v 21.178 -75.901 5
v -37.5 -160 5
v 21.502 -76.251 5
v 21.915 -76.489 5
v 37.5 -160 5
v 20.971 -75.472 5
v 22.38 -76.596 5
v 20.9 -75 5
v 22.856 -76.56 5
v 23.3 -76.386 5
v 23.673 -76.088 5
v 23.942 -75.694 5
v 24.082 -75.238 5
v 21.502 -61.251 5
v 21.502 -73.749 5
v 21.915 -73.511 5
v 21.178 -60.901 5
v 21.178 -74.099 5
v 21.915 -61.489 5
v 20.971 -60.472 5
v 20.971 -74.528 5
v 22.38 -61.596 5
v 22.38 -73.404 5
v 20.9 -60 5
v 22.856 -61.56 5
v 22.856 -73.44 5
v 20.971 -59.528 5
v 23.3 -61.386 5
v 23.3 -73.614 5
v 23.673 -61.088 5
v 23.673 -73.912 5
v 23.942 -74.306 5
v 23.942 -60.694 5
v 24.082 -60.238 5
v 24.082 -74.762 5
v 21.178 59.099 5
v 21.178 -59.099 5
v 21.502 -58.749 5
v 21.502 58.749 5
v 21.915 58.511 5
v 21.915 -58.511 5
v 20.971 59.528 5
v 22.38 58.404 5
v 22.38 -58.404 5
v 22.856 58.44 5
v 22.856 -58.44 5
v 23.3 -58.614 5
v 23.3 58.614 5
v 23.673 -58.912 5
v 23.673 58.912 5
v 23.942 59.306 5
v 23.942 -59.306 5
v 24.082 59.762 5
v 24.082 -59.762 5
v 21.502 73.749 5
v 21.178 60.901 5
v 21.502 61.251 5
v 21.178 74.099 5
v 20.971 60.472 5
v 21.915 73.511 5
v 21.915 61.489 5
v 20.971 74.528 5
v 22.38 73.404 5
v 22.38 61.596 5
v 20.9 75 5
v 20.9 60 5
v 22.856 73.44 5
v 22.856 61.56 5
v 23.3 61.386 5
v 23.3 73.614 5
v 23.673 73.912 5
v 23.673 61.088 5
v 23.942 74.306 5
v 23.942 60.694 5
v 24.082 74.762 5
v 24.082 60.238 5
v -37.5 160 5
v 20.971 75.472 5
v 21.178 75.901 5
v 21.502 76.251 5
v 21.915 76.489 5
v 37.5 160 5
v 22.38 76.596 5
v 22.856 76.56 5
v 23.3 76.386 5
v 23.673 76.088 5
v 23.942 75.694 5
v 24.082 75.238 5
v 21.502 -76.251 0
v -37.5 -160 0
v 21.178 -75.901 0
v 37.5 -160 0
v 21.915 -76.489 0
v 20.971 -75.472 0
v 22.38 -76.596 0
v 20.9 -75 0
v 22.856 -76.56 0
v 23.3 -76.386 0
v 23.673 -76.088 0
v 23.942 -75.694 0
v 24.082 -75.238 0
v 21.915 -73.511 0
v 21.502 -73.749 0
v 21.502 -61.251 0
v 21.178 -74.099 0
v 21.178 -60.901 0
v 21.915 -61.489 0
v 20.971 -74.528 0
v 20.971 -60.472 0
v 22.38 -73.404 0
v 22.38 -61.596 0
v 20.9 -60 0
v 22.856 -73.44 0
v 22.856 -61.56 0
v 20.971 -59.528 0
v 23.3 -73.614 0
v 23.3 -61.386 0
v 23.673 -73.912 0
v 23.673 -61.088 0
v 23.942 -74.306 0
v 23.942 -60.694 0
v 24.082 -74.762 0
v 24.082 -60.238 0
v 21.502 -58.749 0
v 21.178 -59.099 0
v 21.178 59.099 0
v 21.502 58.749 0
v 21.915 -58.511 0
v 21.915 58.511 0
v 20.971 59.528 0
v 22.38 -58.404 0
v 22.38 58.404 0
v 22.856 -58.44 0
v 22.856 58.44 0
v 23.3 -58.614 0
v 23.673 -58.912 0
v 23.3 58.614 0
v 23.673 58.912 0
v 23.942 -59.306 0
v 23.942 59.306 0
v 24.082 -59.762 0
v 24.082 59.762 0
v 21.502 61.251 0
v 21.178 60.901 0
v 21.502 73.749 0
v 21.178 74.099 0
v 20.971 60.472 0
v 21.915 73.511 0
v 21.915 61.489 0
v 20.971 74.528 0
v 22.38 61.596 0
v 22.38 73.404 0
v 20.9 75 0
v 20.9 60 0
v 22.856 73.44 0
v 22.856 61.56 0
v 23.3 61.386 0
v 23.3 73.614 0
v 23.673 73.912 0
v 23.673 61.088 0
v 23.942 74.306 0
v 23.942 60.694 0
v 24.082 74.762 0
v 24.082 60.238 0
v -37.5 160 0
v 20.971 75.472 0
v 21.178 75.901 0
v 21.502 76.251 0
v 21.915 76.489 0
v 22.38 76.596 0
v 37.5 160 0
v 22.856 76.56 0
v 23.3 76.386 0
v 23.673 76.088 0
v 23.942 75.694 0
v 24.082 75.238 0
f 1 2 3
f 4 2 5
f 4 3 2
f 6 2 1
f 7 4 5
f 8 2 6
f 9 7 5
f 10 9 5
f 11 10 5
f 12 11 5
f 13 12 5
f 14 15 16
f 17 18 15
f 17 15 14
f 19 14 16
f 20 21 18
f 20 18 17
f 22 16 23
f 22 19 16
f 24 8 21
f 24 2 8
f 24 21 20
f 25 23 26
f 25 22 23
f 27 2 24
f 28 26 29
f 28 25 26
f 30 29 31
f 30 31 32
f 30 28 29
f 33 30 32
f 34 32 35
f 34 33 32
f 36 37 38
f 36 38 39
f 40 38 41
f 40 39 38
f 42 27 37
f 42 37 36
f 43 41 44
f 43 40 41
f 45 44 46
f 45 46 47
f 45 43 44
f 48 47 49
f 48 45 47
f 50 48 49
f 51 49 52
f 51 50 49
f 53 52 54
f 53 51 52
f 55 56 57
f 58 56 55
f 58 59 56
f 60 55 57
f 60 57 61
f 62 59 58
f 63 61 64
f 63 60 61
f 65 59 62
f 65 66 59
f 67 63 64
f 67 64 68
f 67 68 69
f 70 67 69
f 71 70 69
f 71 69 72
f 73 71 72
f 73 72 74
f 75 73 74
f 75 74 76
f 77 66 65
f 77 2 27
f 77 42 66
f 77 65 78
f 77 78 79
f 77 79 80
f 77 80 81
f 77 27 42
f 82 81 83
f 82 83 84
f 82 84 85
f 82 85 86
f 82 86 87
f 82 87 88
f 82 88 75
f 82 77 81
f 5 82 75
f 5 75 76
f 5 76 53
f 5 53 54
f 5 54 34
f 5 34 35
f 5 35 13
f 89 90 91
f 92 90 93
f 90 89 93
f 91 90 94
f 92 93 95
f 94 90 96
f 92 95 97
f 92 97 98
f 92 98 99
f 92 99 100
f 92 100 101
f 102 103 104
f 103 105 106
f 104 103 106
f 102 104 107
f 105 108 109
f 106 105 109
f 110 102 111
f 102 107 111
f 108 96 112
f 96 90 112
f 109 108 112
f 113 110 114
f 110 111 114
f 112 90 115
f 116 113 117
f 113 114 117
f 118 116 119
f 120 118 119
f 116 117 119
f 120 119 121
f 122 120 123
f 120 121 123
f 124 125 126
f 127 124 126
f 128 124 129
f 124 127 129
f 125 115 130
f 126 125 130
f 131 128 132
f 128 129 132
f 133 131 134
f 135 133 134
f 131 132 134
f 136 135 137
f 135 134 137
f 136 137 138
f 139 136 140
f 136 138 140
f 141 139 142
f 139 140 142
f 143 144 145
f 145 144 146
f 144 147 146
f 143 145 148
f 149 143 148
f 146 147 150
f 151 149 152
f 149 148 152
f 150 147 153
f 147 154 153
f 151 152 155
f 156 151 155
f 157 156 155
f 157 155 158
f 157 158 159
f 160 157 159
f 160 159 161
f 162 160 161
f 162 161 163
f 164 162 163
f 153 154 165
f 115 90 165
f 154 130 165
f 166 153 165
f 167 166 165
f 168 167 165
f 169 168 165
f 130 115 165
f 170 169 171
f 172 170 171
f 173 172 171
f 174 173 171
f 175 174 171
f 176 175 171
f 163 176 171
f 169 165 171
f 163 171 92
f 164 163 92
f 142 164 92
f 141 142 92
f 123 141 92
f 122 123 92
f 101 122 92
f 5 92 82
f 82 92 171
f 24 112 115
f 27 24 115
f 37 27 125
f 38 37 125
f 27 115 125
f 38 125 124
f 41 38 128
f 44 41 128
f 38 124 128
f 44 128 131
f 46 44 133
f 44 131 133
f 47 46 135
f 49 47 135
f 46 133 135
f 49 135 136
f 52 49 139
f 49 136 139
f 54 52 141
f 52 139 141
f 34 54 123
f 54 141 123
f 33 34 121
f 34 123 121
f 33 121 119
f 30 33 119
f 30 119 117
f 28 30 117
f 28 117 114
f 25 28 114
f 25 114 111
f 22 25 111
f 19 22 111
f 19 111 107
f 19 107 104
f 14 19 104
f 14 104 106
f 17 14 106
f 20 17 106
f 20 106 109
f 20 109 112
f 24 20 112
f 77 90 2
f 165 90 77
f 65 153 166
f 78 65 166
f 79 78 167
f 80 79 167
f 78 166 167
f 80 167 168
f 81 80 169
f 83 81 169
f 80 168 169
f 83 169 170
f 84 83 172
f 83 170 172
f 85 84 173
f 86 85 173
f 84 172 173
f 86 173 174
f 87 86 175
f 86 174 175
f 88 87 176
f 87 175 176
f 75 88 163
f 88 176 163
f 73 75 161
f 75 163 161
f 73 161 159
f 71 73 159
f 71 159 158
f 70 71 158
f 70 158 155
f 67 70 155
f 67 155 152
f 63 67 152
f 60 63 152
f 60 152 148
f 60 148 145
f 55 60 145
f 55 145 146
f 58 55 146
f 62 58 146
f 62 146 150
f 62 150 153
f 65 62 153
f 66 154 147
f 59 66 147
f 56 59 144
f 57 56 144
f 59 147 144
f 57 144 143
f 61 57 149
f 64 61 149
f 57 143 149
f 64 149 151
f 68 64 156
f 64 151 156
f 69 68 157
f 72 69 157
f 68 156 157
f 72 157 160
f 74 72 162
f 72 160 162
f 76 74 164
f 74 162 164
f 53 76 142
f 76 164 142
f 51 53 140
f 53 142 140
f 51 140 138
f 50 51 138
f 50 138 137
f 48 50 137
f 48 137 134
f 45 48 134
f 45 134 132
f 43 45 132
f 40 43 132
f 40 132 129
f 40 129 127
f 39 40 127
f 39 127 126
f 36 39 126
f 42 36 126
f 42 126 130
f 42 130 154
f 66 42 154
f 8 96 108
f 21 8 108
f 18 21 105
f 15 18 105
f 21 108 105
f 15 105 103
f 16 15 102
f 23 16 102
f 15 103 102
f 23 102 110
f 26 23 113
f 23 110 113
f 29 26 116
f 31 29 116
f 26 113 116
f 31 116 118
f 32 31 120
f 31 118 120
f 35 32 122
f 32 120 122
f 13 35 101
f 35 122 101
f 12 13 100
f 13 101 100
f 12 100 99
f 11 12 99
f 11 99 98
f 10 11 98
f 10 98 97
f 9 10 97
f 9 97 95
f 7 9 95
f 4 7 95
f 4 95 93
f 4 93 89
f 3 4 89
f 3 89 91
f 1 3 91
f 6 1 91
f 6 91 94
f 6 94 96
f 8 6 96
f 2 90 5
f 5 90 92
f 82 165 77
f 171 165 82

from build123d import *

# Parameters (mm, degrees)
SKETCH1_W           = 75
SKETCH1_H           = 320
BOSS_EXTRUDE1_DEPTH = 5
CUT_EXTRUDE1_REACH  = 7
SKETCH2_R           = 1.6


with BuildPart() as part:
    # Sketch1 → Boss-Extrude1 (new body)
    with BuildSketch(Plane.XY):
        Rectangle(SKETCH1_W, SKETCH1_H)
    extrude(amount=BOSS_EXTRUDE1_DEPTH)

    # Sketch2 → Cut-Extrude1 (cut, up to next)
    with BuildSketch(Plane(origin=(0, 0, 0), x_dir=(-1, 0, 0), z_dir=(0, 0, -1)), mode=Mode.PRIVATE) as cut_extrude1_sk1:
        with Locations((-22.5, 75)):
            Circle(SKETCH2_R)
    cut_extrude1_tool1 = extrude(cut_extrude1_sk1.sketch, amount=-CUT_EXTRUDE1_REACH, mode=Mode.PRIVATE) & part.part
    add(cut_extrude1_tool1.solids().sort_by_distance((22.5, 75, 0))[0], mode=Mode.SUBTRACT)
    # Sketch2 → Cut-Extrude1 (cut, up to next)
    with BuildSketch(Plane(origin=(0, 0, 0), x_dir=(-1, 0, 0), z_dir=(0, 0, -1)), mode=Mode.PRIVATE) as cut_extrude1_sk2:
        with Locations((-22.5, 60)):
            Circle(SKETCH2_R)
    cut_extrude1_tool2 = extrude(cut_extrude1_sk2.sketch, amount=-CUT_EXTRUDE1_REACH, mode=Mode.PRIVATE) & part.part
    add(cut_extrude1_tool2.solids().sort_by_distance((22.5, 60, 0))[0], mode=Mode.SUBTRACT)
    # Sketch2 → Cut-Extrude1 (cut, up to next)
    with BuildSketch(Plane(origin=(0, 0, 0), x_dir=(-1, 0, 0), z_dir=(0, 0, -1)), mode=Mode.PRIVATE) as cut_extrude1_sk3:
        with Locations((-22.5, -60)):
            Circle(SKETCH2_R)
    cut_extrude1_tool3 = extrude(cut_extrude1_sk3.sketch, amount=-CUT_EXTRUDE1_REACH, mode=Mode.PRIVATE) & part.part
    add(cut_extrude1_tool3.solids().sort_by_distance((22.5, -60, 0))[0], mode=Mode.SUBTRACT)
    # Sketch2 → Cut-Extrude1 (cut, up to next)
    with BuildSketch(Plane(origin=(0, 0, 0), x_dir=(-1, 0, 0), z_dir=(0, 0, -1)), mode=Mode.PRIVATE) as cut_extrude1_sk4:
        with Locations((-22.5, -75)):
            Circle(SKETCH2_R)
    cut_extrude1_tool4 = extrude(cut_extrude1_sk4.sketch, amount=-CUT_EXTRUDE1_REACH, mode=Mode.PRIVATE) & part.part
    add(cut_extrude1_tool4.solids().sort_by_distance((22.5, -75, 0))[0], mode=Mode.SUBTRACT)


solid = part.part
